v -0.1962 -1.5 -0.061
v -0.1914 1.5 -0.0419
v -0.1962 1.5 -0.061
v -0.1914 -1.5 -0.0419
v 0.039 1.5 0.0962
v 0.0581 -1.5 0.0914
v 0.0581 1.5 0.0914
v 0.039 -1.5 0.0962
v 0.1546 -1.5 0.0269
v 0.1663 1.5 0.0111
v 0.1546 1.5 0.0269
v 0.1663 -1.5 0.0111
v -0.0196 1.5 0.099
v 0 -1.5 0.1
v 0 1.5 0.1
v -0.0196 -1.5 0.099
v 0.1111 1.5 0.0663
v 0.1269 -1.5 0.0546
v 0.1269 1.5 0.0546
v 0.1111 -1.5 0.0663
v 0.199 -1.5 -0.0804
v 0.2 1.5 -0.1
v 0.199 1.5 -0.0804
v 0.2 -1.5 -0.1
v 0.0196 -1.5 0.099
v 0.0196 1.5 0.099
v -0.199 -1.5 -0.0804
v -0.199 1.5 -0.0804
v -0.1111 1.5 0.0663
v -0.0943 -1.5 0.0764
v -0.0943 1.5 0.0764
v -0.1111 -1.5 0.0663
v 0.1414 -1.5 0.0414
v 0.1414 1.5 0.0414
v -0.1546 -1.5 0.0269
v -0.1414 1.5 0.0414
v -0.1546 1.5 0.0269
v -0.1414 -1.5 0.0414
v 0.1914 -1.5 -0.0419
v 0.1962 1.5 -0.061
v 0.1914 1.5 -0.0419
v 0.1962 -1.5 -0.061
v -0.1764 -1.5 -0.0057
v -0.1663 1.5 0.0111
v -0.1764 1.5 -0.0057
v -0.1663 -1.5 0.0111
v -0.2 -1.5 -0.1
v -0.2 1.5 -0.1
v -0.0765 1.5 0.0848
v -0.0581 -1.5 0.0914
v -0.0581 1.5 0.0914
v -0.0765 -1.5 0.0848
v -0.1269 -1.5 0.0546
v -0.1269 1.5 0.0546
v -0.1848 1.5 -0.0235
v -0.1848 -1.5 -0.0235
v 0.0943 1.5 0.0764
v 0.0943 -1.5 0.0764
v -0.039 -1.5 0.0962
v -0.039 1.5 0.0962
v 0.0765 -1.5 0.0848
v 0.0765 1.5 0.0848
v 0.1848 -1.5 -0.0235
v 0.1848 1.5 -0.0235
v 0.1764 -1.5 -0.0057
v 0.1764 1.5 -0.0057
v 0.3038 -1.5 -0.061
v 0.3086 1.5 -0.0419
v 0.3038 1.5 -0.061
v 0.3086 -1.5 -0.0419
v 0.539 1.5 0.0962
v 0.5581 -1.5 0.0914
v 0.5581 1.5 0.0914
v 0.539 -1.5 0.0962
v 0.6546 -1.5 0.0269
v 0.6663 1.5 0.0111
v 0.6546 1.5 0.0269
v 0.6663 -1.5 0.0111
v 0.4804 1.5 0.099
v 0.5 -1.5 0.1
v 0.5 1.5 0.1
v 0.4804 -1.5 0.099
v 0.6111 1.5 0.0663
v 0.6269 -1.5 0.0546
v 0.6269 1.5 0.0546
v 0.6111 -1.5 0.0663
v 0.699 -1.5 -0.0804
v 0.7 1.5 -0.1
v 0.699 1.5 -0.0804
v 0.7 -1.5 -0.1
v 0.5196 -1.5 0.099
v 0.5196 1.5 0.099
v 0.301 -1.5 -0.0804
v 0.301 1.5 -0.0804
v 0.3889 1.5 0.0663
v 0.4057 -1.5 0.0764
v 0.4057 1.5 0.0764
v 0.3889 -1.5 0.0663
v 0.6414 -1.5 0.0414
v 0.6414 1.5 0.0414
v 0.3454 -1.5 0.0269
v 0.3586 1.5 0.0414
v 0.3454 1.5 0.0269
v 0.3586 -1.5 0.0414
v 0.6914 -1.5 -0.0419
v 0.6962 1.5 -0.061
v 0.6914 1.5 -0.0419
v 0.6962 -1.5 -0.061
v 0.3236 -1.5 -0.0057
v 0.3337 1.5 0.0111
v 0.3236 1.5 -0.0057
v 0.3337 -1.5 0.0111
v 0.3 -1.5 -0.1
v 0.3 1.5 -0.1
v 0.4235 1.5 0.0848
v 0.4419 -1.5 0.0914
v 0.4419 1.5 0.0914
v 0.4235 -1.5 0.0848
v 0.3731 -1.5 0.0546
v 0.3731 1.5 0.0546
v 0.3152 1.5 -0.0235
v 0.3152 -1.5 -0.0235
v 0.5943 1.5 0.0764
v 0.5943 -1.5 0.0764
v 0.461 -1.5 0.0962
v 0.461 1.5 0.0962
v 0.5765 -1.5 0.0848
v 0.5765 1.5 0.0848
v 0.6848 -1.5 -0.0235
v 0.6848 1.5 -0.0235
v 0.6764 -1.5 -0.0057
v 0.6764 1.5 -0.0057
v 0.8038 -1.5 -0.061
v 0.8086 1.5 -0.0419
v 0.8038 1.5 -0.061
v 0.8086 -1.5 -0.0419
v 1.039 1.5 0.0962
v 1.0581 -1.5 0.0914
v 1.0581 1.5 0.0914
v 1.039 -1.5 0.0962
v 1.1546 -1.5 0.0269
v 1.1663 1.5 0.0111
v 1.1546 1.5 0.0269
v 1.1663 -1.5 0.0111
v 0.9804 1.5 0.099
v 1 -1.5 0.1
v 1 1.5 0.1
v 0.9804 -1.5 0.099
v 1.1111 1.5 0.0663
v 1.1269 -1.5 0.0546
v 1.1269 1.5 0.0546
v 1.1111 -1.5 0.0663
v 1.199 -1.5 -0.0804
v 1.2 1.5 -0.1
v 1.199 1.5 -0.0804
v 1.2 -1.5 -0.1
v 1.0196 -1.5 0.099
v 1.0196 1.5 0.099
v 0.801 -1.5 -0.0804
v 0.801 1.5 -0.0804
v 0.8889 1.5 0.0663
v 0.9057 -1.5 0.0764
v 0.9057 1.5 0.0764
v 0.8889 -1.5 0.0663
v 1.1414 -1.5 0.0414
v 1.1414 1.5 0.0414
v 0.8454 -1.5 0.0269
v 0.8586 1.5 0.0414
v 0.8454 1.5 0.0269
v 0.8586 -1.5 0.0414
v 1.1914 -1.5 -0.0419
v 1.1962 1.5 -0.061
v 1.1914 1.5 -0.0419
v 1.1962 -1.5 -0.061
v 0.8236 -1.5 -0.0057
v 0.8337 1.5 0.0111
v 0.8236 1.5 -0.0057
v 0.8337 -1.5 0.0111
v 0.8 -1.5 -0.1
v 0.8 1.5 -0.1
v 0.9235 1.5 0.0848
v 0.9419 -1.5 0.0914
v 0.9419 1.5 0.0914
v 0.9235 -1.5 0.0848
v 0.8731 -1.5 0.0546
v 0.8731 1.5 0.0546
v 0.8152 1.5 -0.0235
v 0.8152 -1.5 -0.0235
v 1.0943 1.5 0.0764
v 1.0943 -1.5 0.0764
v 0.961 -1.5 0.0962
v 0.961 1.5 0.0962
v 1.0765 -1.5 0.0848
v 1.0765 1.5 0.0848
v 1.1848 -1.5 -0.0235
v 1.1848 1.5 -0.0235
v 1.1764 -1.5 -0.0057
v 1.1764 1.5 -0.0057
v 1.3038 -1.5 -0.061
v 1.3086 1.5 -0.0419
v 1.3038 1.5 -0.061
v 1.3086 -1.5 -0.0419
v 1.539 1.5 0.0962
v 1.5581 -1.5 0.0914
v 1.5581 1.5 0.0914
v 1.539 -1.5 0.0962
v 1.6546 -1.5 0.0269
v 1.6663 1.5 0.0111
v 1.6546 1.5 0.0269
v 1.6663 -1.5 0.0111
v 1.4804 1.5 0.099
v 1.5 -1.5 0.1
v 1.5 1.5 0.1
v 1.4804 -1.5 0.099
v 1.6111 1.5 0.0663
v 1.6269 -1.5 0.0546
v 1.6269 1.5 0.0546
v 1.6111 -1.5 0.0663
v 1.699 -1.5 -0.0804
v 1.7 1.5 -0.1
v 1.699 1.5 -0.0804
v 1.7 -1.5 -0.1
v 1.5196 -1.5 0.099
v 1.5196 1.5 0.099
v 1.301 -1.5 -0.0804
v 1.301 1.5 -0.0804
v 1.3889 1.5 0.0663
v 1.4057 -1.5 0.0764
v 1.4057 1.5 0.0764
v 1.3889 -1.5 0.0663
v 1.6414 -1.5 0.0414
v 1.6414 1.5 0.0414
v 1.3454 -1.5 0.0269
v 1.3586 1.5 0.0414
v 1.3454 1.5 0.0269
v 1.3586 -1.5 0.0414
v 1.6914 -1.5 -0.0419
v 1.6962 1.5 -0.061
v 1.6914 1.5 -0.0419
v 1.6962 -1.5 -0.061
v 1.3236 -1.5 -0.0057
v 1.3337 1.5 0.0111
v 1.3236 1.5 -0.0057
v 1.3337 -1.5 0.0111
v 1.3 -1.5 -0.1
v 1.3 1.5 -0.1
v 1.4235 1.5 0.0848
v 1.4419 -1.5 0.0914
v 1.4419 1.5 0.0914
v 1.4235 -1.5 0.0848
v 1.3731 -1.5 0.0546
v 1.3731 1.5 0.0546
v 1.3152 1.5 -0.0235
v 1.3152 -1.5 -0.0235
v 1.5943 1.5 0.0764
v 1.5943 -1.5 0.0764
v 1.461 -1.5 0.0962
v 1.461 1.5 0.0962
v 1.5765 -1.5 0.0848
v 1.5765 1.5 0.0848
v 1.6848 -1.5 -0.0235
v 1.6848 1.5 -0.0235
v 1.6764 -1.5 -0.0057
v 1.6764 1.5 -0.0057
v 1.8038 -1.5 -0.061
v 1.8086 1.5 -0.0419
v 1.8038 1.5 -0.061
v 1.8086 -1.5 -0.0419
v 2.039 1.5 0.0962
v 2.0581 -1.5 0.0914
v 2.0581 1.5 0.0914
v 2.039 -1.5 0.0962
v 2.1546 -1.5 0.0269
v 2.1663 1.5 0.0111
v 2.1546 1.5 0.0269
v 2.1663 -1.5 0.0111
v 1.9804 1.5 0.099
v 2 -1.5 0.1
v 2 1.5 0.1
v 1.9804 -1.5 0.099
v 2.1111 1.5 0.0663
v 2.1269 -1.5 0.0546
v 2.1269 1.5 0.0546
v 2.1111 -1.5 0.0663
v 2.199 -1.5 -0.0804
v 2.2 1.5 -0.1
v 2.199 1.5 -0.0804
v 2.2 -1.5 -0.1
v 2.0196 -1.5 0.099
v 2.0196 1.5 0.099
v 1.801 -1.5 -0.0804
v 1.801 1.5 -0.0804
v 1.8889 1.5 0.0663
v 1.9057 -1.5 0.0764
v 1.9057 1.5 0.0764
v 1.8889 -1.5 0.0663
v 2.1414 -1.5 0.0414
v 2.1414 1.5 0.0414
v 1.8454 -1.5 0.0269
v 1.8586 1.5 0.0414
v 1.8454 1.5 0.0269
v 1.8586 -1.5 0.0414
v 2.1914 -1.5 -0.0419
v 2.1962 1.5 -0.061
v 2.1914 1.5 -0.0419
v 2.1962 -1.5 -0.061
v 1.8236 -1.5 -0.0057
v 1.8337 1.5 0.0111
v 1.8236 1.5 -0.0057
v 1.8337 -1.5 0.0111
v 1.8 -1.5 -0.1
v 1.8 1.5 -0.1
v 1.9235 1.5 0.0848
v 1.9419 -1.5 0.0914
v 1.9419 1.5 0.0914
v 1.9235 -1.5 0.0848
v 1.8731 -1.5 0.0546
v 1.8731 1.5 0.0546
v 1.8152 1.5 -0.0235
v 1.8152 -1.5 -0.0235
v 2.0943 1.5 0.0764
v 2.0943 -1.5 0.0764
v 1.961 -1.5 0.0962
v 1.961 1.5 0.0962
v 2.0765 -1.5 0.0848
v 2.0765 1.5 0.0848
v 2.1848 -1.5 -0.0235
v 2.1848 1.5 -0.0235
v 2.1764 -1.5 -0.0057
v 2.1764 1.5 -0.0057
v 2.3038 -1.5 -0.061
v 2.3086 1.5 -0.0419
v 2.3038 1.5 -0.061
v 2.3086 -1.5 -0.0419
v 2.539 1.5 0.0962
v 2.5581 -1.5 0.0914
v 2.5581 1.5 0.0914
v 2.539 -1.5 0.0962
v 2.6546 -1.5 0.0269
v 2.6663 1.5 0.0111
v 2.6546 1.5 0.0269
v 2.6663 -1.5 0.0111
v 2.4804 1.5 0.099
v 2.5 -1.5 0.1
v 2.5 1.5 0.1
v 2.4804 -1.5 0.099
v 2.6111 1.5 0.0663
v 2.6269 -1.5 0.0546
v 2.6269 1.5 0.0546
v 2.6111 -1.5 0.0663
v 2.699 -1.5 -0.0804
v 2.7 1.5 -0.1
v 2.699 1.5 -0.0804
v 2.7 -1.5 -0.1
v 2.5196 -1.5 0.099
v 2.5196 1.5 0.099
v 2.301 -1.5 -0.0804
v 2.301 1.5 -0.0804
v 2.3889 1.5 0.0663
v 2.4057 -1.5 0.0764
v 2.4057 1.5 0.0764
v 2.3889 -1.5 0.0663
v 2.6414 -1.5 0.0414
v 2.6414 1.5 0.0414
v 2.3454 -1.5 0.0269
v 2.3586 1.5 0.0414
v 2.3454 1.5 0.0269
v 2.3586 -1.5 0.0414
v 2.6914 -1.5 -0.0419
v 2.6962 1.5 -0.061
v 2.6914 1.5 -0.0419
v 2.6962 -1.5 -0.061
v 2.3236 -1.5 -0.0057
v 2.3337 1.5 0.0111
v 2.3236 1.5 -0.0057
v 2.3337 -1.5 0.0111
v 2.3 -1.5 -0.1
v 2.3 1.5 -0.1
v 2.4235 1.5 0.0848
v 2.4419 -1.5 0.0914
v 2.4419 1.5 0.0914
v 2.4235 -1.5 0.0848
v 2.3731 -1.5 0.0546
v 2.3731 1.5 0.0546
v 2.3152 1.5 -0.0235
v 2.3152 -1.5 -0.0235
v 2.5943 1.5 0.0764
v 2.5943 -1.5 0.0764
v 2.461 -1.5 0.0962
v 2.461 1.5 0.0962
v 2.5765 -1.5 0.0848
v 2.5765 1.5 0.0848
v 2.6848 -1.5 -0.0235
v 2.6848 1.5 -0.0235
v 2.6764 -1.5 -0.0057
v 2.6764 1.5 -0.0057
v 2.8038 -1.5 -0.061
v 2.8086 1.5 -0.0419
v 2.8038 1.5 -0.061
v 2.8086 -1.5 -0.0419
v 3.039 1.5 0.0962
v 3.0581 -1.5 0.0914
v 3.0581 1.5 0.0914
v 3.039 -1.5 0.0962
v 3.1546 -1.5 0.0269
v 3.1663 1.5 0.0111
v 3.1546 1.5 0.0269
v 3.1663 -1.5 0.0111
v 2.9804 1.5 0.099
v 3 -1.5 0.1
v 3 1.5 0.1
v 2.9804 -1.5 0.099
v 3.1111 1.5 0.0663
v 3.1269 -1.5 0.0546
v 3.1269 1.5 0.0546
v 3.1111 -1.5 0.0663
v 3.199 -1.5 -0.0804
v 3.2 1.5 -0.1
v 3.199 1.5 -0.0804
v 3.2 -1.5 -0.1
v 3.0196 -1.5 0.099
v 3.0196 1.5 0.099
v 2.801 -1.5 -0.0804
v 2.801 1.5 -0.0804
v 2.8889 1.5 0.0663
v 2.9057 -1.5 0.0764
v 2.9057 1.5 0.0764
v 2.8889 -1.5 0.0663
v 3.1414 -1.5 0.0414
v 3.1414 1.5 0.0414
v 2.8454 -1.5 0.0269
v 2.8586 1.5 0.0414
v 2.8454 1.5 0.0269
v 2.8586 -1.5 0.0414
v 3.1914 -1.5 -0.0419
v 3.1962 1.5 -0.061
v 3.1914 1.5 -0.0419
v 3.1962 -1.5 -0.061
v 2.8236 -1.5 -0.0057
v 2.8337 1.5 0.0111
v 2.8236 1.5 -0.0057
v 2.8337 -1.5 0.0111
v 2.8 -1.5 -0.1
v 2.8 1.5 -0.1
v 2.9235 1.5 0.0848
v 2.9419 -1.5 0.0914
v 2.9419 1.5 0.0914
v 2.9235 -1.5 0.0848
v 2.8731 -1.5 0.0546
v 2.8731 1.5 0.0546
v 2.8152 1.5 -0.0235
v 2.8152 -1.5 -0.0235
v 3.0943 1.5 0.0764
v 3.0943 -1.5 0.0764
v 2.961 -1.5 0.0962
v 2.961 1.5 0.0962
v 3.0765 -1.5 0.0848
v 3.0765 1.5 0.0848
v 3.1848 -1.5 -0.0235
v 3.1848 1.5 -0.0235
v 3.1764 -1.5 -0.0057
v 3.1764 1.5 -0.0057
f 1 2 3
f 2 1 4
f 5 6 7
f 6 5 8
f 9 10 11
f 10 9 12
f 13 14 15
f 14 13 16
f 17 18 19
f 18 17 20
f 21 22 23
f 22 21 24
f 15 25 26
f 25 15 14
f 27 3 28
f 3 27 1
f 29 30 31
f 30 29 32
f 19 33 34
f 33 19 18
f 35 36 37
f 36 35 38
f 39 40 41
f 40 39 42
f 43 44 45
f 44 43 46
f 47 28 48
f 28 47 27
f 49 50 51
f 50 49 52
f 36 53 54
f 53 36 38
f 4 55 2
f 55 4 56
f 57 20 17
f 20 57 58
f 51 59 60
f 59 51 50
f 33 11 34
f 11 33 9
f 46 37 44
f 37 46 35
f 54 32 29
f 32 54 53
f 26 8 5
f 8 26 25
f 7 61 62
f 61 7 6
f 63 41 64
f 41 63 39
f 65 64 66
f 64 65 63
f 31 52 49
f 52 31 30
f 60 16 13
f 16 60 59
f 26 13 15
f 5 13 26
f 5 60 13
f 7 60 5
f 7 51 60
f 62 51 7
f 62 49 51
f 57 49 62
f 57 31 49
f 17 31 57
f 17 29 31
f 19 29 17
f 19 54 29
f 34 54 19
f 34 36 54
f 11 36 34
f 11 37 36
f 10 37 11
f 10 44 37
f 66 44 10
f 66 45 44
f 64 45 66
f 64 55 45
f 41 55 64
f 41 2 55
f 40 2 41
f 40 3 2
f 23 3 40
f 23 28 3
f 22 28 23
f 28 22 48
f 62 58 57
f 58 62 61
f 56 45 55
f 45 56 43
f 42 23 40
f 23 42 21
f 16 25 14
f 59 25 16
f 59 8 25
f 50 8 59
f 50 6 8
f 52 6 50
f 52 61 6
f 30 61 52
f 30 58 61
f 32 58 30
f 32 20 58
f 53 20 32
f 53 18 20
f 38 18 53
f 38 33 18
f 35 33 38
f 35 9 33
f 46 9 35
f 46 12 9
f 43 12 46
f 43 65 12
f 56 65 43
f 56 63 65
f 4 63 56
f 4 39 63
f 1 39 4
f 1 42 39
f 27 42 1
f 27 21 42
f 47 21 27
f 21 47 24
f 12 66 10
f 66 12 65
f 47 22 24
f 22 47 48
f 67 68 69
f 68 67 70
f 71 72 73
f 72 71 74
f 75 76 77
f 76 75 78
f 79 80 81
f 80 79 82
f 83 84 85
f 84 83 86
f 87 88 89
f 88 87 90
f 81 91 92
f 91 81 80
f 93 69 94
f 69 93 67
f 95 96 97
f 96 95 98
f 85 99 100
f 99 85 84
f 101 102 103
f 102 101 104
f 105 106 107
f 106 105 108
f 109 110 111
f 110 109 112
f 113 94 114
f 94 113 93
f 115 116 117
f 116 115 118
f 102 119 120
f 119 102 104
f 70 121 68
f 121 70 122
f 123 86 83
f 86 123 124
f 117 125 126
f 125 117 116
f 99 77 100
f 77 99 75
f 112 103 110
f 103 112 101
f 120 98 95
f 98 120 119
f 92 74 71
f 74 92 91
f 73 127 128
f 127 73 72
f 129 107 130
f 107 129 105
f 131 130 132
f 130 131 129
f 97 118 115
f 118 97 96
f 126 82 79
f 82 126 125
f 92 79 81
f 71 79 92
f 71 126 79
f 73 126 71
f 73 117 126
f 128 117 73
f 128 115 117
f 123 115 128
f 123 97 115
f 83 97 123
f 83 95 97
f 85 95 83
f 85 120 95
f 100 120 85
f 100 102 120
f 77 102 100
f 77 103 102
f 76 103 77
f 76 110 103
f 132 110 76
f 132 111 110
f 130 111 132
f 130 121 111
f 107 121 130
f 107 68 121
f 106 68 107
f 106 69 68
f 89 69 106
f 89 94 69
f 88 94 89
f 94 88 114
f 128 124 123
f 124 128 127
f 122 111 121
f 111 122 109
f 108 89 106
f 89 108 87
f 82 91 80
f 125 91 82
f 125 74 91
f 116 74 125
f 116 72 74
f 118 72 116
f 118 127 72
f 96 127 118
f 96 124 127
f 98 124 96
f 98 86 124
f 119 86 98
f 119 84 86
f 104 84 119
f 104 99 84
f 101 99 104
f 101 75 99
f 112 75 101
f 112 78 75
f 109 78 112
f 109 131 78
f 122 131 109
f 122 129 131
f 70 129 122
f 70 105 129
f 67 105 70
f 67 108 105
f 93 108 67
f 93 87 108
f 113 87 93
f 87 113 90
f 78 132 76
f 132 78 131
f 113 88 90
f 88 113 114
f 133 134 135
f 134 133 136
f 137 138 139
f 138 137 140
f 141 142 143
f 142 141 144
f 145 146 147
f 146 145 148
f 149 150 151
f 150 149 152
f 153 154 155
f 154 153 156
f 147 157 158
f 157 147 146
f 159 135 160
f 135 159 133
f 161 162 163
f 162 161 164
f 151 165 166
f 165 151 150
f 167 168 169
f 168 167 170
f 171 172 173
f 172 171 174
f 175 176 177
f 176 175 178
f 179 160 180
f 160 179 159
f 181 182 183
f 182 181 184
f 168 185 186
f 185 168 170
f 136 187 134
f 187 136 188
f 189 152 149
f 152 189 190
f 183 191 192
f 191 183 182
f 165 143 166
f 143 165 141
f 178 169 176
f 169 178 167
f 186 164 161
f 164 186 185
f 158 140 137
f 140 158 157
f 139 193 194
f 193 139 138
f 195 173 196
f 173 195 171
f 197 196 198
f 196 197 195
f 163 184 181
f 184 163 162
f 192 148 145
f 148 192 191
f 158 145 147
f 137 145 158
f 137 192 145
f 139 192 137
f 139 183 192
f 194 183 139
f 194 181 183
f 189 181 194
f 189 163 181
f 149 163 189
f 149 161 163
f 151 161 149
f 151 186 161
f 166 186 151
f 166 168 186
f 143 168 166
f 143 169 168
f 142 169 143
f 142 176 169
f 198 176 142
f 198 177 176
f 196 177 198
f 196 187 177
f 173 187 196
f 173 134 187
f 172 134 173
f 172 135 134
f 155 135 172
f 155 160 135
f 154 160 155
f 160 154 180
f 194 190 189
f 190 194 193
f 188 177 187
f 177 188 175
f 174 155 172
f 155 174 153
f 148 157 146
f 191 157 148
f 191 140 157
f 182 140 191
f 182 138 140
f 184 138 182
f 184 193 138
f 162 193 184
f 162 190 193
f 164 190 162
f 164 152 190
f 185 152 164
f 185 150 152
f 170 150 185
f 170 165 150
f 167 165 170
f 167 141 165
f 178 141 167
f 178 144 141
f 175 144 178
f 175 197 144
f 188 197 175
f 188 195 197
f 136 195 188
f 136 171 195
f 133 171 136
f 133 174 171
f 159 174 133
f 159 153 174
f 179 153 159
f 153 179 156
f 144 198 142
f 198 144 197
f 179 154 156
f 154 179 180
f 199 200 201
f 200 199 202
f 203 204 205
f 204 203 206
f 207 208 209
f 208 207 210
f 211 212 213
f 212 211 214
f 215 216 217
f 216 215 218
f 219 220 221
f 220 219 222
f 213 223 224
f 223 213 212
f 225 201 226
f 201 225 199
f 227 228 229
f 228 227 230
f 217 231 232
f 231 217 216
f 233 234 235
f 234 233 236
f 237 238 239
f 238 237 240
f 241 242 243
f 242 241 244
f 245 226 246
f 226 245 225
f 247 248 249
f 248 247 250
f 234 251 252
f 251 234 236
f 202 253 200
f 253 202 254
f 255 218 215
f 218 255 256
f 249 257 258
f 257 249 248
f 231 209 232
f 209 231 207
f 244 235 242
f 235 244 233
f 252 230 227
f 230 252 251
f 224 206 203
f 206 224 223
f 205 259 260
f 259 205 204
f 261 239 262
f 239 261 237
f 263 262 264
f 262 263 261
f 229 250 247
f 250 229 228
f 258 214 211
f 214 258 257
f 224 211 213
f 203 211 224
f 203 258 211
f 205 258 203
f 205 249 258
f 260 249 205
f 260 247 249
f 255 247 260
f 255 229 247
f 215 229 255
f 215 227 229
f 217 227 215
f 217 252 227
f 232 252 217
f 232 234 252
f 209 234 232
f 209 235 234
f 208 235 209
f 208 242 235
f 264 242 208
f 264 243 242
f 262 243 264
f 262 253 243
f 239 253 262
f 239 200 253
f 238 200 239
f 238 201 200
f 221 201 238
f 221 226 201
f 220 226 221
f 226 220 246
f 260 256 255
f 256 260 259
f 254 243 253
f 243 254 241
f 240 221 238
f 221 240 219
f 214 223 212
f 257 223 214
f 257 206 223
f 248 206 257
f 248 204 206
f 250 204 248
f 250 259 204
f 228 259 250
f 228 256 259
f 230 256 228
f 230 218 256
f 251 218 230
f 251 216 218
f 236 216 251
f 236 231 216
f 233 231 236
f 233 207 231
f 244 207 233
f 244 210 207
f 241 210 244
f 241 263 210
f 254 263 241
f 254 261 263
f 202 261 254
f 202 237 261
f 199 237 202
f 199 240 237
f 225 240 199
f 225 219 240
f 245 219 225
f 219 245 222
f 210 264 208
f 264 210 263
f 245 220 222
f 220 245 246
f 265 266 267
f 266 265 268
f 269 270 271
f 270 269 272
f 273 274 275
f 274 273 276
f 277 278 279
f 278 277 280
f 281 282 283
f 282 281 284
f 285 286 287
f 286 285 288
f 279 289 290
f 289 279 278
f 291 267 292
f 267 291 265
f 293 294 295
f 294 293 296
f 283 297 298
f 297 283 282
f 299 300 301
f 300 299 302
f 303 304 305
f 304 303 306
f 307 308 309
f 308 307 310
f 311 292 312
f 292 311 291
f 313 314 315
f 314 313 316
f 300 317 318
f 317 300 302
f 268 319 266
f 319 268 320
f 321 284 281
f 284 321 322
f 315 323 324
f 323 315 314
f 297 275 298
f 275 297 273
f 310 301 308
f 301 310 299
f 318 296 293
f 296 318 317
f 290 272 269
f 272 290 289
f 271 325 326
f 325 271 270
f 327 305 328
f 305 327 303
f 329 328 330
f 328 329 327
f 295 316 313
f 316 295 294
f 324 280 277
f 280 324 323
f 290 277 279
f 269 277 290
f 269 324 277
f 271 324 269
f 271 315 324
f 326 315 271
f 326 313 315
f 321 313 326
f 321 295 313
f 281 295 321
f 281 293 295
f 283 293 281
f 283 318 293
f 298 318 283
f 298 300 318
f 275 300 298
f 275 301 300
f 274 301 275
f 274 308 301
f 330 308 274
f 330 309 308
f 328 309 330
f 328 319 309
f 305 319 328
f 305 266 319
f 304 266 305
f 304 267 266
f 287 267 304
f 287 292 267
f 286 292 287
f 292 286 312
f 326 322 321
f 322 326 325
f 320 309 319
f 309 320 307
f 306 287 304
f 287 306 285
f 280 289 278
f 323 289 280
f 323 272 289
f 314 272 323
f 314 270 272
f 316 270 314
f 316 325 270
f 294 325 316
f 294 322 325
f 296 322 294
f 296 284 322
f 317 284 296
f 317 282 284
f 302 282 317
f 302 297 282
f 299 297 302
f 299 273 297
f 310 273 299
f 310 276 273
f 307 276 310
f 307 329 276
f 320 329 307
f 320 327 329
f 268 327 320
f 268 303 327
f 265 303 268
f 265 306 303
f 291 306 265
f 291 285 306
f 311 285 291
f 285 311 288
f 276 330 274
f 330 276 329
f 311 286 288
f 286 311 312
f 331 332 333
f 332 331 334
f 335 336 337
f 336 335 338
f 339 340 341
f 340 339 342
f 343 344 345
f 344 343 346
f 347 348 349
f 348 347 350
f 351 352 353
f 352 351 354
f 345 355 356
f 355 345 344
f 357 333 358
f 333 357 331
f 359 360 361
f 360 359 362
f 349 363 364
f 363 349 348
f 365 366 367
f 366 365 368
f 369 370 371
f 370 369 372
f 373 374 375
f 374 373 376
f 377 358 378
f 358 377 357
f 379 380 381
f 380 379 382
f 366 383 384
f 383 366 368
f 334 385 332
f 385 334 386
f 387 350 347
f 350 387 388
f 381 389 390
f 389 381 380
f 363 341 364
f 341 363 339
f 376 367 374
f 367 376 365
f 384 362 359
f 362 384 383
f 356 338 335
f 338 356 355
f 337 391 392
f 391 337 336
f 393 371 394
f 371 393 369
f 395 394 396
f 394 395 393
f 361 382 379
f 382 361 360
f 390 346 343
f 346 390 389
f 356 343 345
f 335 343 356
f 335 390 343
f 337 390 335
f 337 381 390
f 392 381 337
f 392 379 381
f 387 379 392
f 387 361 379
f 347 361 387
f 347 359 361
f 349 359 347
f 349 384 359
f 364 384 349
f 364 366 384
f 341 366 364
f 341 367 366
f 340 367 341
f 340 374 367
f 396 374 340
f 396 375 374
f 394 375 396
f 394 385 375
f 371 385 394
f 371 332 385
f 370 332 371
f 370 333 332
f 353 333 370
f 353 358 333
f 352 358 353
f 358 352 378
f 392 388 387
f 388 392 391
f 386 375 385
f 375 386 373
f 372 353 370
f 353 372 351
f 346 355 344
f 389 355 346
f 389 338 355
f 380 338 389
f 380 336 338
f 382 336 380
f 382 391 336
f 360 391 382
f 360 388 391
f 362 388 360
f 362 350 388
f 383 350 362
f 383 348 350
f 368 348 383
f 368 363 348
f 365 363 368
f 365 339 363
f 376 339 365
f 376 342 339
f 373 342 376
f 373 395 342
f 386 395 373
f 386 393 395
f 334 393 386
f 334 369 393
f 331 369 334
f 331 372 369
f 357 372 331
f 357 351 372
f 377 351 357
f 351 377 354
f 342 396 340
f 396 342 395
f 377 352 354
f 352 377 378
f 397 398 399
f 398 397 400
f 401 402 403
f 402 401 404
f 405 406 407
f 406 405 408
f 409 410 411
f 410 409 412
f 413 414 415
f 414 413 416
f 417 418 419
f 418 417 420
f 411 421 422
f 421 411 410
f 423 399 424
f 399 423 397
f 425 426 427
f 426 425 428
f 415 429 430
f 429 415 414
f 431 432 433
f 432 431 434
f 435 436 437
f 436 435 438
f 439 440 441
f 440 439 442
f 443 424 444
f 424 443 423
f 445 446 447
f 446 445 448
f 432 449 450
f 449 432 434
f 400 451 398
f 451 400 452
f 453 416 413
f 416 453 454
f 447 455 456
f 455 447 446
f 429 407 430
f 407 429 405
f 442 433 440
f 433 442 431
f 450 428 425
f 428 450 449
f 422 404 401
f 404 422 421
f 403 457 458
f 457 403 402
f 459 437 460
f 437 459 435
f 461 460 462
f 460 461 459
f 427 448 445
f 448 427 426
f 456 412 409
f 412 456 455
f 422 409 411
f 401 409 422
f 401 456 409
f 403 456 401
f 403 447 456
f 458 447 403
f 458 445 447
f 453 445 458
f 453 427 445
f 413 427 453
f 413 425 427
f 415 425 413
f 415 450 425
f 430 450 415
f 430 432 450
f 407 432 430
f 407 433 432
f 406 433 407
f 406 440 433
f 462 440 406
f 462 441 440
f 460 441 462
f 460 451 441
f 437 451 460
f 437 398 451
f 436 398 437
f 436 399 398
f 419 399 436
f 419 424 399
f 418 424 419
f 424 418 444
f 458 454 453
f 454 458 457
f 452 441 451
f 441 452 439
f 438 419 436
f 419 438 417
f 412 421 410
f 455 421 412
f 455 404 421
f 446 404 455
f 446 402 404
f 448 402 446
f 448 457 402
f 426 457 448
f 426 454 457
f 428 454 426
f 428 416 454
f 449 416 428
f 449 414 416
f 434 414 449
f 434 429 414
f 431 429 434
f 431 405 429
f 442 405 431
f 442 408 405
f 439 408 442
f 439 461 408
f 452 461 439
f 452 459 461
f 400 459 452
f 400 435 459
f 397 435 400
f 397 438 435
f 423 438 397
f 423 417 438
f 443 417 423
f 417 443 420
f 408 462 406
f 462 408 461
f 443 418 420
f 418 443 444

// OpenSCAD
// ==== PARAMETERS ====
bead_radius = 0.2;
bead_length = 3.0;
bead_spacing = 0.1;  // space between beads

// ==== INPUT: CURVE AS LIST OF 2D POINTS ====
curve_points = [
    [0, 0],
    [0.5, 0],
    [1, 0],
    [1.5, 0],
    [2, 0],
    [2.5,0],
    [3,0]
];

// ==== MODULE: HALF CYLINDER ====
module halfMoon(height, r) {
  translate([r/2,0,-height/2]) difference() {
    cylinder(h=height, r=r, $fn = 64);
    translate([r/2,0,height/2]) cube(size=[r, r*2, height+0.2], center=true);
  }
}

// ==== MODULE: PLACE BEADS ALONG CURVE ====
module place_beads(pts) {
    for (i = [0 : len(pts) - 1]) {
        x = pts[i][0];
        y = pts[i][1];
        z = 0;
        
        translate([x, y, z]) rotate([0,90,90]) halfMoon(3,0.2);
    }
}

// ==== MAIN ====
place_beads(curve_points);
